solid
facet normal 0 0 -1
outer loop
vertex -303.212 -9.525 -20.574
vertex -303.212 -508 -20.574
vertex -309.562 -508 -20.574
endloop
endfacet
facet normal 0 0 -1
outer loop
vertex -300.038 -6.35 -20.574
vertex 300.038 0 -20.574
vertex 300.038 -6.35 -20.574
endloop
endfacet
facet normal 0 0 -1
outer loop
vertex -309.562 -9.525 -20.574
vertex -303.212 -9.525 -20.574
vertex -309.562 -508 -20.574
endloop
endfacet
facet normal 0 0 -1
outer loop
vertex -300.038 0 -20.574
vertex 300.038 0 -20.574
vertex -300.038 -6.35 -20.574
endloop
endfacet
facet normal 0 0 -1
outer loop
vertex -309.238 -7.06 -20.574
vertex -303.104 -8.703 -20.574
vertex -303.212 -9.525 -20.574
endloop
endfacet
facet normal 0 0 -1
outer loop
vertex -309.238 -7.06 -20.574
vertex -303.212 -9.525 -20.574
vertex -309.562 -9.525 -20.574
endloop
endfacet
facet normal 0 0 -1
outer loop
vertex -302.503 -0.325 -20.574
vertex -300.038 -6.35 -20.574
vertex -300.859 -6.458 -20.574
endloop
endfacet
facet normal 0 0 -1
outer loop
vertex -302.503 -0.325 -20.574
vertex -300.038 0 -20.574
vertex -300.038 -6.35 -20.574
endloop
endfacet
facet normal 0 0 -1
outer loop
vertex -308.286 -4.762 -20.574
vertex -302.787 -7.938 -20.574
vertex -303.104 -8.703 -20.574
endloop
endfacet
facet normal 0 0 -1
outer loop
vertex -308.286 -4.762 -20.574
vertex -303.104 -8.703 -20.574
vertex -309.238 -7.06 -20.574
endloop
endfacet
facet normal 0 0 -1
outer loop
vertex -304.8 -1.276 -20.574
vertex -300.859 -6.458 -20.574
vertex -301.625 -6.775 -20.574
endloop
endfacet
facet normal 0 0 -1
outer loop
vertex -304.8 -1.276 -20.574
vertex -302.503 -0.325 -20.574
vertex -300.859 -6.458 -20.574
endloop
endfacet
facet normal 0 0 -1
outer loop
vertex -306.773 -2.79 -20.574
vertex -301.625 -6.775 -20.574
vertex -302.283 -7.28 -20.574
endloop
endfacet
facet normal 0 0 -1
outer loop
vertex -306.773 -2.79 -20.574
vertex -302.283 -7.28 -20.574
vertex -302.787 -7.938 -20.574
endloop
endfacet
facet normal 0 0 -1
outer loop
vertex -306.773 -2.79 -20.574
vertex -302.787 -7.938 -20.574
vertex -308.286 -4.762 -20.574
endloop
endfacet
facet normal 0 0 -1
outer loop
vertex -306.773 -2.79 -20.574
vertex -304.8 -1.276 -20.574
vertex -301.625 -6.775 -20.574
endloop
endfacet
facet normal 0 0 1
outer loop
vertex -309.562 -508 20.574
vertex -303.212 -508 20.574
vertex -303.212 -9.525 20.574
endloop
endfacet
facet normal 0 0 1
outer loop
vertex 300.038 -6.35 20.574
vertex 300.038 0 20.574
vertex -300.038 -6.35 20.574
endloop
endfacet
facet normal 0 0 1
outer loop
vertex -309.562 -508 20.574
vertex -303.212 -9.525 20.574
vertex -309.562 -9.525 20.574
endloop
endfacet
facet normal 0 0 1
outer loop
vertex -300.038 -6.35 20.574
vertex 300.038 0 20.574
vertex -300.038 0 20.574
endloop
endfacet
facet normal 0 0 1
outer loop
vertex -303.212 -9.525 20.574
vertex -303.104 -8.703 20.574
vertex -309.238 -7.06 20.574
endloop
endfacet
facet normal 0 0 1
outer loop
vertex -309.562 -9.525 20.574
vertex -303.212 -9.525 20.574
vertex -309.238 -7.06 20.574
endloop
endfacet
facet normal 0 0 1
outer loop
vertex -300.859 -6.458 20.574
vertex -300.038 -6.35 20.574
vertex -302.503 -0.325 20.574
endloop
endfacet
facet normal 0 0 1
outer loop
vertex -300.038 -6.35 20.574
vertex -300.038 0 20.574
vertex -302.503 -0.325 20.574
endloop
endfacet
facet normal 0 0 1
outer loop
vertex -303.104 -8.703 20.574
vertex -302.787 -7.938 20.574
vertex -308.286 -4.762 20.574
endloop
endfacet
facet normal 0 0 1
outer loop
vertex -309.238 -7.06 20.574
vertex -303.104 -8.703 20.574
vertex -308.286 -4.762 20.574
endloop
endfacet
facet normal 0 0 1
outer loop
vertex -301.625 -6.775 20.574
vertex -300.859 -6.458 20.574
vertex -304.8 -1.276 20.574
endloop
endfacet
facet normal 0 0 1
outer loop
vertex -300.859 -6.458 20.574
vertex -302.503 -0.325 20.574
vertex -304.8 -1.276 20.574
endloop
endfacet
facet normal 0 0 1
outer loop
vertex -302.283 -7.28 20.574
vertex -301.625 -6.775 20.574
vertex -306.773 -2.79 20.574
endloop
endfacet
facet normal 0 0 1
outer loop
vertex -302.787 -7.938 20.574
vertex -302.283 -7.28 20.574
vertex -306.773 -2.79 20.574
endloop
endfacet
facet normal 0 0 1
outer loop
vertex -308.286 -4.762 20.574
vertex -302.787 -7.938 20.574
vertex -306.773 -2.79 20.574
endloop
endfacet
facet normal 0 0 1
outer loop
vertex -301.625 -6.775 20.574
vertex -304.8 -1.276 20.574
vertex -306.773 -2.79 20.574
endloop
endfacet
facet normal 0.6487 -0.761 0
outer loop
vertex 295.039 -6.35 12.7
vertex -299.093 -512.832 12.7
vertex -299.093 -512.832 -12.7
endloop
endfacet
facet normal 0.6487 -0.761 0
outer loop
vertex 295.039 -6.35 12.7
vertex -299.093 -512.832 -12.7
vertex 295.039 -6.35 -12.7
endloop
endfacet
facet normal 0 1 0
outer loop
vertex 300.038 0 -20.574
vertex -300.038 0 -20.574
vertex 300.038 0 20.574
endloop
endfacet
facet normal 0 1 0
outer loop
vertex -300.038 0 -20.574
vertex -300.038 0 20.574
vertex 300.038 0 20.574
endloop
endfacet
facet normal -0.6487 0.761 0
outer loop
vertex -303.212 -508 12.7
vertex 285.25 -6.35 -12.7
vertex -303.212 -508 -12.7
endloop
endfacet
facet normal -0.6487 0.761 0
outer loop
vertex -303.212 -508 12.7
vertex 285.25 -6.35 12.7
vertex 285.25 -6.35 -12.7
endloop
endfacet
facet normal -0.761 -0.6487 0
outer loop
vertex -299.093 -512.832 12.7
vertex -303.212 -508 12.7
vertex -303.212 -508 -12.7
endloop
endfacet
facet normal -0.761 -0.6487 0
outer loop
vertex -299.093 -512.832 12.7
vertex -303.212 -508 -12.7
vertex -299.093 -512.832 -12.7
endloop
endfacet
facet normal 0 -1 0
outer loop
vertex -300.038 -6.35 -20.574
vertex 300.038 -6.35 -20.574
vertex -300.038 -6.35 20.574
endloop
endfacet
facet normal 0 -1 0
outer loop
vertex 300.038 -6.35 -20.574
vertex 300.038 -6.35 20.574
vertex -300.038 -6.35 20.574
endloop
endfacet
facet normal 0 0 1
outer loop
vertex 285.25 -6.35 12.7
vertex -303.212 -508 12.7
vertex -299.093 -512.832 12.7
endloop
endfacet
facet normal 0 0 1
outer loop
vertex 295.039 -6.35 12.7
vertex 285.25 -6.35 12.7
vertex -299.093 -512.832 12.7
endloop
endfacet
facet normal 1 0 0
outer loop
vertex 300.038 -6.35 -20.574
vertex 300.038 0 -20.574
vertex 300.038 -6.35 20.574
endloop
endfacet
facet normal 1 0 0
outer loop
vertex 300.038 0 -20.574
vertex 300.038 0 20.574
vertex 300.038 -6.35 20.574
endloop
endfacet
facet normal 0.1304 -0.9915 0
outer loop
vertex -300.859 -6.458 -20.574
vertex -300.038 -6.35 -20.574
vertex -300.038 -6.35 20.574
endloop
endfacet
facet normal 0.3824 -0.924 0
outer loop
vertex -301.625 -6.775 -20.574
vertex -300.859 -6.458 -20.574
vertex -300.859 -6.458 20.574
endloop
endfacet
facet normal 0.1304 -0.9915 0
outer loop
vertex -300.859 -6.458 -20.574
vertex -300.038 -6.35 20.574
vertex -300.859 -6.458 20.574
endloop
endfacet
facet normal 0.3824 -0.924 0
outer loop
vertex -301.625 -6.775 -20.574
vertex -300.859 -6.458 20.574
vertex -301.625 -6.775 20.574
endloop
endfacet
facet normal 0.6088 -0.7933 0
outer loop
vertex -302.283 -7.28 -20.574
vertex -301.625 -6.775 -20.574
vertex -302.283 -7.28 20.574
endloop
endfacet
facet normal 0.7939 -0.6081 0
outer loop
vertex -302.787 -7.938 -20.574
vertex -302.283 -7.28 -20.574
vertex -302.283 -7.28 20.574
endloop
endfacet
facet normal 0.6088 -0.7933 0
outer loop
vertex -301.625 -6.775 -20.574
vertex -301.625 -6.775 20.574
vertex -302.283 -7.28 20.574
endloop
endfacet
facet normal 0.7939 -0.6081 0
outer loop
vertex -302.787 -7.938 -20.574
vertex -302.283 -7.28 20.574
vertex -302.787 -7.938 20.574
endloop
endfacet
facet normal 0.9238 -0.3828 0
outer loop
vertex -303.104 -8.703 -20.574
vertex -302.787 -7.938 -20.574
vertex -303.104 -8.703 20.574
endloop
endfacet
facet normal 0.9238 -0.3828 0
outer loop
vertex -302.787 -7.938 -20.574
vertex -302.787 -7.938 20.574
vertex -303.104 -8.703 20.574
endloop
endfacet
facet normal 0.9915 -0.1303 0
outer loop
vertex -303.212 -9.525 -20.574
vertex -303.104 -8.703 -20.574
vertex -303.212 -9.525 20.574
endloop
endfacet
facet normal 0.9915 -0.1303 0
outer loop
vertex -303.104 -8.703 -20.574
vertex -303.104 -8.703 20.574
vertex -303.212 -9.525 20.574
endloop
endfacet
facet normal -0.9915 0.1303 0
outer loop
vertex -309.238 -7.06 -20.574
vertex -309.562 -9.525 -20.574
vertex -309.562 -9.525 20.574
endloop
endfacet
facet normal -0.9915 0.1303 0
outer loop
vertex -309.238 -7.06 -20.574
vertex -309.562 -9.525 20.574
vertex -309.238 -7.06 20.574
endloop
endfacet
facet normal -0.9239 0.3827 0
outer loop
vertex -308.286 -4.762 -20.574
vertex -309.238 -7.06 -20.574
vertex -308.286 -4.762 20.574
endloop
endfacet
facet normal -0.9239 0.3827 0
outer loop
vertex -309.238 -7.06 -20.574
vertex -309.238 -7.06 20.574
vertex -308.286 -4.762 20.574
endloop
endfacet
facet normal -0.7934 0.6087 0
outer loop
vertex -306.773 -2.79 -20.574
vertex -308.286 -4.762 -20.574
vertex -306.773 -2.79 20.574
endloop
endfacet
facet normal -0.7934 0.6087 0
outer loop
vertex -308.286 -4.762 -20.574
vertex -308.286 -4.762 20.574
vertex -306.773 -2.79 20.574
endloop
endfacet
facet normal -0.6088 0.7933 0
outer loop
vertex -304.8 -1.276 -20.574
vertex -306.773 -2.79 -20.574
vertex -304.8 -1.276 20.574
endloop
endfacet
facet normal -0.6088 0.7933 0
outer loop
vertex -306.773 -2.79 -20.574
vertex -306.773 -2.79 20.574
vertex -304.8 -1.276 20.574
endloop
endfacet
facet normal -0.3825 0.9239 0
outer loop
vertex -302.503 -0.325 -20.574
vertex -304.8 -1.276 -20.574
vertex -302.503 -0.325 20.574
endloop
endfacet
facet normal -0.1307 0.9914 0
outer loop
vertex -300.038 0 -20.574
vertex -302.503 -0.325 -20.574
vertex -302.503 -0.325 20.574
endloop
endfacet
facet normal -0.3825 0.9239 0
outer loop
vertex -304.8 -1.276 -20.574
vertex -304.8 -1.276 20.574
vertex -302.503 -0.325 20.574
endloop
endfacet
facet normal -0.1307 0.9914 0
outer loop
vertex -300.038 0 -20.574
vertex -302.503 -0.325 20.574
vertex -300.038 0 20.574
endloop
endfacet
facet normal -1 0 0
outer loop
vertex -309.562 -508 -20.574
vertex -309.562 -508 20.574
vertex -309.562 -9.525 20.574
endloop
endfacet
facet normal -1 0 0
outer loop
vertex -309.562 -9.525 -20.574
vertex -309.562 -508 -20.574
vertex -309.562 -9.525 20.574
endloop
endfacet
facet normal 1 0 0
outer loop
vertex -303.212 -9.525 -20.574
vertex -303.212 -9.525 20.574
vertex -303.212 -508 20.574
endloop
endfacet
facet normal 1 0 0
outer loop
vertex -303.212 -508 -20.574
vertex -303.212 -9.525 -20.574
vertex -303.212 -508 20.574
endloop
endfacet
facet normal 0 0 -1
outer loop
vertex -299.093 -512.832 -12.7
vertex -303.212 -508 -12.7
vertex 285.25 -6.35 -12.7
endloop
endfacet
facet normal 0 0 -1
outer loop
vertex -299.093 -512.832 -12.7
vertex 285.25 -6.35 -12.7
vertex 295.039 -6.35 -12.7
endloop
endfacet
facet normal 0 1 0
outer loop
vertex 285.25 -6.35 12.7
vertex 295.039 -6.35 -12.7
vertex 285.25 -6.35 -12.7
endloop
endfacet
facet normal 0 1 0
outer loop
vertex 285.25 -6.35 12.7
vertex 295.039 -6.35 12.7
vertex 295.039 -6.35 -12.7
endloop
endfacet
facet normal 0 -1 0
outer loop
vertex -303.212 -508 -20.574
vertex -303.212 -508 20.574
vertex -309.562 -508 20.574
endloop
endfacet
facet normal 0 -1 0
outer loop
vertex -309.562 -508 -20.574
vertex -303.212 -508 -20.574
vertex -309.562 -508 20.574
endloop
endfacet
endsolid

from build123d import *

# Parameters (mm, degrees)
EXTRUDE_THIN1_DEPTH = 20.574
BOSS_EXTRUDE1_DEPTH = 12.7


with BuildPart() as part:
    # Sketch1 → Extrude-Thin1 (new, symmetric)
    with BuildSketch(Plane.XY):
        with BuildLine():
            Line((-309.5625, -508), (-309.5625, -9.525))
            ThreePointArc((-309.5625, -9.525), (-306.772692091, -2.789807909), (-300.0375, 0))
            Line((-300.0375, 0), (300.0375, 0))
            Line((300.0375, 0), (300.0375, -6.35))
            Line((300.0375, -6.35), (-300.0375, -6.35))
            ThreePointArc((-300.0375, -6.35), (-302.28256403, -7.27993597), (-303.2125, -9.525))
            Line((-303.2125, -9.525), (-303.2125, -508))
            Line((-303.2125, -508), (-309.5625, -508))
        make_face()
    extrude(amount=EXTRUDE_THIN1_DEPTH, both=True)


with BuildPart() as body_2:
    # Sketch2 → Boss-Extrude1 (new, symmetric)
    with BuildSketch(Plane.XY):
        Polygon((285.250366412, -6.35), (-303.2125, -508), (-299.092992689, -512.832407217), (295.038551492, -6.35), align=None)
    extrude(amount=BOSS_EXTRUDE1_DEPTH, both=True)


solid = Compound([part.part, body_2.part])
